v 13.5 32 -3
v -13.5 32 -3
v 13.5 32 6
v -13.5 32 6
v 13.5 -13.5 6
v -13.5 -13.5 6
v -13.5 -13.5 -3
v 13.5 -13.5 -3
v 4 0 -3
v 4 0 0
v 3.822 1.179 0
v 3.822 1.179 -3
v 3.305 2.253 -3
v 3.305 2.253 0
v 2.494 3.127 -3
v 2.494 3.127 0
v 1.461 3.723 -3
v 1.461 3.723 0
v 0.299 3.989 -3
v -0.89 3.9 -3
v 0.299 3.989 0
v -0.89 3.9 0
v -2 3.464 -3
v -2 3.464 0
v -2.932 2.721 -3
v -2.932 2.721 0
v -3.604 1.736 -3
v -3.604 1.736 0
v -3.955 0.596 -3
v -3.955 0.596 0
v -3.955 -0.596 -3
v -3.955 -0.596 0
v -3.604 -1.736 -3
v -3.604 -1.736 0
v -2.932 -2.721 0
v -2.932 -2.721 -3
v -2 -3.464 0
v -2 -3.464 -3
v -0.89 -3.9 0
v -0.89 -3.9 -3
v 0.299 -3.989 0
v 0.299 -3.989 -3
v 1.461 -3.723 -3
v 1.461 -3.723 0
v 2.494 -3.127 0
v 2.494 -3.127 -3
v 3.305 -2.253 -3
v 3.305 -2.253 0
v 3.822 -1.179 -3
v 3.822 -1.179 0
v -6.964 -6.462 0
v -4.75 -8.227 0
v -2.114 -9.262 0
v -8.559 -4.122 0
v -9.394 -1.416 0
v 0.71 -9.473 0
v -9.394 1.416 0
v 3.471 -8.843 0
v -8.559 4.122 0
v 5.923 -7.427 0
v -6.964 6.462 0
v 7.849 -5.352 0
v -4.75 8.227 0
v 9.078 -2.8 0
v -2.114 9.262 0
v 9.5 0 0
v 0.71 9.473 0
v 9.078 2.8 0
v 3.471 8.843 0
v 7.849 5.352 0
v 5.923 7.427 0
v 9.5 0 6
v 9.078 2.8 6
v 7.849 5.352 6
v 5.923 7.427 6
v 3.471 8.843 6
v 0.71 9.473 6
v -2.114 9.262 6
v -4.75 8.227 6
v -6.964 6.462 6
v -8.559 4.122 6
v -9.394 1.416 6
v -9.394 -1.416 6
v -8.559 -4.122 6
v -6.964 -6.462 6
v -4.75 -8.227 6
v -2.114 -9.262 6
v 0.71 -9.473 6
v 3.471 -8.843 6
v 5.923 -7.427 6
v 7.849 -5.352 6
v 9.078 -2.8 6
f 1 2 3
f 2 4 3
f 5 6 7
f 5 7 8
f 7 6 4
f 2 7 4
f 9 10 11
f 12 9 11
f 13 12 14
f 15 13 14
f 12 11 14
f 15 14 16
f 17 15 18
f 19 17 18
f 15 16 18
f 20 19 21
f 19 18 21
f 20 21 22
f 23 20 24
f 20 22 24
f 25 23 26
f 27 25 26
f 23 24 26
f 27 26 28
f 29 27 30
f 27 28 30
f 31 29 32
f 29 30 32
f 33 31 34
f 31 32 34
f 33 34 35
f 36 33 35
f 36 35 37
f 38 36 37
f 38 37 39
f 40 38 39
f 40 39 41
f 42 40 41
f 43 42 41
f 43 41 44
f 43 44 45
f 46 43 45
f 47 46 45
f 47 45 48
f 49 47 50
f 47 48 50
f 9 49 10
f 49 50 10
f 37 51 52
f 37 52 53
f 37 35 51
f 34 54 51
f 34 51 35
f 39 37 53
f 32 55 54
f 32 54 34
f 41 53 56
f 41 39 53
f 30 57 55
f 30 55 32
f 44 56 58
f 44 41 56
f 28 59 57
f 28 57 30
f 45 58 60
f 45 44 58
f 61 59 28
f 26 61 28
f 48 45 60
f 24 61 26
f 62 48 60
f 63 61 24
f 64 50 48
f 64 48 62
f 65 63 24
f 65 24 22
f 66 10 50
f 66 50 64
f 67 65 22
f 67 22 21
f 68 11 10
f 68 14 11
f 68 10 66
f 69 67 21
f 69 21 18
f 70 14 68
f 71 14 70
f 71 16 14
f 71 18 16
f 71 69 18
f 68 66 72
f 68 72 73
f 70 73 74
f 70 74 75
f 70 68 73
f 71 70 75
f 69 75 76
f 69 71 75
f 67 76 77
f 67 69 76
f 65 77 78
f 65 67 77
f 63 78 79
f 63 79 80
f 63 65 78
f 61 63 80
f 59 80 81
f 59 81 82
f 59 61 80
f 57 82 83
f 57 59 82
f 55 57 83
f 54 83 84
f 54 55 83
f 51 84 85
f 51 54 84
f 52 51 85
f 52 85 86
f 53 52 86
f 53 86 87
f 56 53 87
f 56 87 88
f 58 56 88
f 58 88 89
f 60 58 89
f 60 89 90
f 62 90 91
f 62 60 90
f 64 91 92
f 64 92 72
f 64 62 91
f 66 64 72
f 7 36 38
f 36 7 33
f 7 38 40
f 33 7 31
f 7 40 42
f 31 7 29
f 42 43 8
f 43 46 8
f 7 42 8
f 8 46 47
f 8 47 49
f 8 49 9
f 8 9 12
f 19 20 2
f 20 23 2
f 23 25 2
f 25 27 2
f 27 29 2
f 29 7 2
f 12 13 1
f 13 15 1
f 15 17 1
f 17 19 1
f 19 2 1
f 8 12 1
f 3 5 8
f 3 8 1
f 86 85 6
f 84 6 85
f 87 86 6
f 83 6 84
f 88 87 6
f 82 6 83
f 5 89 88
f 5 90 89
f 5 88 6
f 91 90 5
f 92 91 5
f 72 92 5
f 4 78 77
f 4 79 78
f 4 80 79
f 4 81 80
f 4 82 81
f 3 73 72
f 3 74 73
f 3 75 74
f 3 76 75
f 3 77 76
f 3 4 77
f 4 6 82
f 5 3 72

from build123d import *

# Parameters (mm, degrees)
F0_W     = 27
F0_H     = 45.5
F0_R     = 9.5
F1_DEPTH = 6
F0_R_2   = 4
F2_DEPTH = 3


with BuildPart() as f1:
    # F0 (on Top) → F1 (new body)
    with BuildSketch(Plane.XY):
        with Locations((0, 9.25)):
            Rectangle(F0_W, F0_H)
        Circle(F0_R, mode=Mode.SUBTRACT)
    extrude(amount=F1_DEPTH)

    # F0 (on Top) → F2 (join)
    with BuildSketch(Plane.XY):
        with Locations((0, 9.25)):
            Rectangle(F0_W, F0_H)
        Circle(F0_R, mode=Mode.SUBTRACT)
        Circle(F0_R)
        Circle(F0_R_2, mode=Mode.SUBTRACT)
    extrude(amount=-F2_DEPTH)


solid = f1.part
